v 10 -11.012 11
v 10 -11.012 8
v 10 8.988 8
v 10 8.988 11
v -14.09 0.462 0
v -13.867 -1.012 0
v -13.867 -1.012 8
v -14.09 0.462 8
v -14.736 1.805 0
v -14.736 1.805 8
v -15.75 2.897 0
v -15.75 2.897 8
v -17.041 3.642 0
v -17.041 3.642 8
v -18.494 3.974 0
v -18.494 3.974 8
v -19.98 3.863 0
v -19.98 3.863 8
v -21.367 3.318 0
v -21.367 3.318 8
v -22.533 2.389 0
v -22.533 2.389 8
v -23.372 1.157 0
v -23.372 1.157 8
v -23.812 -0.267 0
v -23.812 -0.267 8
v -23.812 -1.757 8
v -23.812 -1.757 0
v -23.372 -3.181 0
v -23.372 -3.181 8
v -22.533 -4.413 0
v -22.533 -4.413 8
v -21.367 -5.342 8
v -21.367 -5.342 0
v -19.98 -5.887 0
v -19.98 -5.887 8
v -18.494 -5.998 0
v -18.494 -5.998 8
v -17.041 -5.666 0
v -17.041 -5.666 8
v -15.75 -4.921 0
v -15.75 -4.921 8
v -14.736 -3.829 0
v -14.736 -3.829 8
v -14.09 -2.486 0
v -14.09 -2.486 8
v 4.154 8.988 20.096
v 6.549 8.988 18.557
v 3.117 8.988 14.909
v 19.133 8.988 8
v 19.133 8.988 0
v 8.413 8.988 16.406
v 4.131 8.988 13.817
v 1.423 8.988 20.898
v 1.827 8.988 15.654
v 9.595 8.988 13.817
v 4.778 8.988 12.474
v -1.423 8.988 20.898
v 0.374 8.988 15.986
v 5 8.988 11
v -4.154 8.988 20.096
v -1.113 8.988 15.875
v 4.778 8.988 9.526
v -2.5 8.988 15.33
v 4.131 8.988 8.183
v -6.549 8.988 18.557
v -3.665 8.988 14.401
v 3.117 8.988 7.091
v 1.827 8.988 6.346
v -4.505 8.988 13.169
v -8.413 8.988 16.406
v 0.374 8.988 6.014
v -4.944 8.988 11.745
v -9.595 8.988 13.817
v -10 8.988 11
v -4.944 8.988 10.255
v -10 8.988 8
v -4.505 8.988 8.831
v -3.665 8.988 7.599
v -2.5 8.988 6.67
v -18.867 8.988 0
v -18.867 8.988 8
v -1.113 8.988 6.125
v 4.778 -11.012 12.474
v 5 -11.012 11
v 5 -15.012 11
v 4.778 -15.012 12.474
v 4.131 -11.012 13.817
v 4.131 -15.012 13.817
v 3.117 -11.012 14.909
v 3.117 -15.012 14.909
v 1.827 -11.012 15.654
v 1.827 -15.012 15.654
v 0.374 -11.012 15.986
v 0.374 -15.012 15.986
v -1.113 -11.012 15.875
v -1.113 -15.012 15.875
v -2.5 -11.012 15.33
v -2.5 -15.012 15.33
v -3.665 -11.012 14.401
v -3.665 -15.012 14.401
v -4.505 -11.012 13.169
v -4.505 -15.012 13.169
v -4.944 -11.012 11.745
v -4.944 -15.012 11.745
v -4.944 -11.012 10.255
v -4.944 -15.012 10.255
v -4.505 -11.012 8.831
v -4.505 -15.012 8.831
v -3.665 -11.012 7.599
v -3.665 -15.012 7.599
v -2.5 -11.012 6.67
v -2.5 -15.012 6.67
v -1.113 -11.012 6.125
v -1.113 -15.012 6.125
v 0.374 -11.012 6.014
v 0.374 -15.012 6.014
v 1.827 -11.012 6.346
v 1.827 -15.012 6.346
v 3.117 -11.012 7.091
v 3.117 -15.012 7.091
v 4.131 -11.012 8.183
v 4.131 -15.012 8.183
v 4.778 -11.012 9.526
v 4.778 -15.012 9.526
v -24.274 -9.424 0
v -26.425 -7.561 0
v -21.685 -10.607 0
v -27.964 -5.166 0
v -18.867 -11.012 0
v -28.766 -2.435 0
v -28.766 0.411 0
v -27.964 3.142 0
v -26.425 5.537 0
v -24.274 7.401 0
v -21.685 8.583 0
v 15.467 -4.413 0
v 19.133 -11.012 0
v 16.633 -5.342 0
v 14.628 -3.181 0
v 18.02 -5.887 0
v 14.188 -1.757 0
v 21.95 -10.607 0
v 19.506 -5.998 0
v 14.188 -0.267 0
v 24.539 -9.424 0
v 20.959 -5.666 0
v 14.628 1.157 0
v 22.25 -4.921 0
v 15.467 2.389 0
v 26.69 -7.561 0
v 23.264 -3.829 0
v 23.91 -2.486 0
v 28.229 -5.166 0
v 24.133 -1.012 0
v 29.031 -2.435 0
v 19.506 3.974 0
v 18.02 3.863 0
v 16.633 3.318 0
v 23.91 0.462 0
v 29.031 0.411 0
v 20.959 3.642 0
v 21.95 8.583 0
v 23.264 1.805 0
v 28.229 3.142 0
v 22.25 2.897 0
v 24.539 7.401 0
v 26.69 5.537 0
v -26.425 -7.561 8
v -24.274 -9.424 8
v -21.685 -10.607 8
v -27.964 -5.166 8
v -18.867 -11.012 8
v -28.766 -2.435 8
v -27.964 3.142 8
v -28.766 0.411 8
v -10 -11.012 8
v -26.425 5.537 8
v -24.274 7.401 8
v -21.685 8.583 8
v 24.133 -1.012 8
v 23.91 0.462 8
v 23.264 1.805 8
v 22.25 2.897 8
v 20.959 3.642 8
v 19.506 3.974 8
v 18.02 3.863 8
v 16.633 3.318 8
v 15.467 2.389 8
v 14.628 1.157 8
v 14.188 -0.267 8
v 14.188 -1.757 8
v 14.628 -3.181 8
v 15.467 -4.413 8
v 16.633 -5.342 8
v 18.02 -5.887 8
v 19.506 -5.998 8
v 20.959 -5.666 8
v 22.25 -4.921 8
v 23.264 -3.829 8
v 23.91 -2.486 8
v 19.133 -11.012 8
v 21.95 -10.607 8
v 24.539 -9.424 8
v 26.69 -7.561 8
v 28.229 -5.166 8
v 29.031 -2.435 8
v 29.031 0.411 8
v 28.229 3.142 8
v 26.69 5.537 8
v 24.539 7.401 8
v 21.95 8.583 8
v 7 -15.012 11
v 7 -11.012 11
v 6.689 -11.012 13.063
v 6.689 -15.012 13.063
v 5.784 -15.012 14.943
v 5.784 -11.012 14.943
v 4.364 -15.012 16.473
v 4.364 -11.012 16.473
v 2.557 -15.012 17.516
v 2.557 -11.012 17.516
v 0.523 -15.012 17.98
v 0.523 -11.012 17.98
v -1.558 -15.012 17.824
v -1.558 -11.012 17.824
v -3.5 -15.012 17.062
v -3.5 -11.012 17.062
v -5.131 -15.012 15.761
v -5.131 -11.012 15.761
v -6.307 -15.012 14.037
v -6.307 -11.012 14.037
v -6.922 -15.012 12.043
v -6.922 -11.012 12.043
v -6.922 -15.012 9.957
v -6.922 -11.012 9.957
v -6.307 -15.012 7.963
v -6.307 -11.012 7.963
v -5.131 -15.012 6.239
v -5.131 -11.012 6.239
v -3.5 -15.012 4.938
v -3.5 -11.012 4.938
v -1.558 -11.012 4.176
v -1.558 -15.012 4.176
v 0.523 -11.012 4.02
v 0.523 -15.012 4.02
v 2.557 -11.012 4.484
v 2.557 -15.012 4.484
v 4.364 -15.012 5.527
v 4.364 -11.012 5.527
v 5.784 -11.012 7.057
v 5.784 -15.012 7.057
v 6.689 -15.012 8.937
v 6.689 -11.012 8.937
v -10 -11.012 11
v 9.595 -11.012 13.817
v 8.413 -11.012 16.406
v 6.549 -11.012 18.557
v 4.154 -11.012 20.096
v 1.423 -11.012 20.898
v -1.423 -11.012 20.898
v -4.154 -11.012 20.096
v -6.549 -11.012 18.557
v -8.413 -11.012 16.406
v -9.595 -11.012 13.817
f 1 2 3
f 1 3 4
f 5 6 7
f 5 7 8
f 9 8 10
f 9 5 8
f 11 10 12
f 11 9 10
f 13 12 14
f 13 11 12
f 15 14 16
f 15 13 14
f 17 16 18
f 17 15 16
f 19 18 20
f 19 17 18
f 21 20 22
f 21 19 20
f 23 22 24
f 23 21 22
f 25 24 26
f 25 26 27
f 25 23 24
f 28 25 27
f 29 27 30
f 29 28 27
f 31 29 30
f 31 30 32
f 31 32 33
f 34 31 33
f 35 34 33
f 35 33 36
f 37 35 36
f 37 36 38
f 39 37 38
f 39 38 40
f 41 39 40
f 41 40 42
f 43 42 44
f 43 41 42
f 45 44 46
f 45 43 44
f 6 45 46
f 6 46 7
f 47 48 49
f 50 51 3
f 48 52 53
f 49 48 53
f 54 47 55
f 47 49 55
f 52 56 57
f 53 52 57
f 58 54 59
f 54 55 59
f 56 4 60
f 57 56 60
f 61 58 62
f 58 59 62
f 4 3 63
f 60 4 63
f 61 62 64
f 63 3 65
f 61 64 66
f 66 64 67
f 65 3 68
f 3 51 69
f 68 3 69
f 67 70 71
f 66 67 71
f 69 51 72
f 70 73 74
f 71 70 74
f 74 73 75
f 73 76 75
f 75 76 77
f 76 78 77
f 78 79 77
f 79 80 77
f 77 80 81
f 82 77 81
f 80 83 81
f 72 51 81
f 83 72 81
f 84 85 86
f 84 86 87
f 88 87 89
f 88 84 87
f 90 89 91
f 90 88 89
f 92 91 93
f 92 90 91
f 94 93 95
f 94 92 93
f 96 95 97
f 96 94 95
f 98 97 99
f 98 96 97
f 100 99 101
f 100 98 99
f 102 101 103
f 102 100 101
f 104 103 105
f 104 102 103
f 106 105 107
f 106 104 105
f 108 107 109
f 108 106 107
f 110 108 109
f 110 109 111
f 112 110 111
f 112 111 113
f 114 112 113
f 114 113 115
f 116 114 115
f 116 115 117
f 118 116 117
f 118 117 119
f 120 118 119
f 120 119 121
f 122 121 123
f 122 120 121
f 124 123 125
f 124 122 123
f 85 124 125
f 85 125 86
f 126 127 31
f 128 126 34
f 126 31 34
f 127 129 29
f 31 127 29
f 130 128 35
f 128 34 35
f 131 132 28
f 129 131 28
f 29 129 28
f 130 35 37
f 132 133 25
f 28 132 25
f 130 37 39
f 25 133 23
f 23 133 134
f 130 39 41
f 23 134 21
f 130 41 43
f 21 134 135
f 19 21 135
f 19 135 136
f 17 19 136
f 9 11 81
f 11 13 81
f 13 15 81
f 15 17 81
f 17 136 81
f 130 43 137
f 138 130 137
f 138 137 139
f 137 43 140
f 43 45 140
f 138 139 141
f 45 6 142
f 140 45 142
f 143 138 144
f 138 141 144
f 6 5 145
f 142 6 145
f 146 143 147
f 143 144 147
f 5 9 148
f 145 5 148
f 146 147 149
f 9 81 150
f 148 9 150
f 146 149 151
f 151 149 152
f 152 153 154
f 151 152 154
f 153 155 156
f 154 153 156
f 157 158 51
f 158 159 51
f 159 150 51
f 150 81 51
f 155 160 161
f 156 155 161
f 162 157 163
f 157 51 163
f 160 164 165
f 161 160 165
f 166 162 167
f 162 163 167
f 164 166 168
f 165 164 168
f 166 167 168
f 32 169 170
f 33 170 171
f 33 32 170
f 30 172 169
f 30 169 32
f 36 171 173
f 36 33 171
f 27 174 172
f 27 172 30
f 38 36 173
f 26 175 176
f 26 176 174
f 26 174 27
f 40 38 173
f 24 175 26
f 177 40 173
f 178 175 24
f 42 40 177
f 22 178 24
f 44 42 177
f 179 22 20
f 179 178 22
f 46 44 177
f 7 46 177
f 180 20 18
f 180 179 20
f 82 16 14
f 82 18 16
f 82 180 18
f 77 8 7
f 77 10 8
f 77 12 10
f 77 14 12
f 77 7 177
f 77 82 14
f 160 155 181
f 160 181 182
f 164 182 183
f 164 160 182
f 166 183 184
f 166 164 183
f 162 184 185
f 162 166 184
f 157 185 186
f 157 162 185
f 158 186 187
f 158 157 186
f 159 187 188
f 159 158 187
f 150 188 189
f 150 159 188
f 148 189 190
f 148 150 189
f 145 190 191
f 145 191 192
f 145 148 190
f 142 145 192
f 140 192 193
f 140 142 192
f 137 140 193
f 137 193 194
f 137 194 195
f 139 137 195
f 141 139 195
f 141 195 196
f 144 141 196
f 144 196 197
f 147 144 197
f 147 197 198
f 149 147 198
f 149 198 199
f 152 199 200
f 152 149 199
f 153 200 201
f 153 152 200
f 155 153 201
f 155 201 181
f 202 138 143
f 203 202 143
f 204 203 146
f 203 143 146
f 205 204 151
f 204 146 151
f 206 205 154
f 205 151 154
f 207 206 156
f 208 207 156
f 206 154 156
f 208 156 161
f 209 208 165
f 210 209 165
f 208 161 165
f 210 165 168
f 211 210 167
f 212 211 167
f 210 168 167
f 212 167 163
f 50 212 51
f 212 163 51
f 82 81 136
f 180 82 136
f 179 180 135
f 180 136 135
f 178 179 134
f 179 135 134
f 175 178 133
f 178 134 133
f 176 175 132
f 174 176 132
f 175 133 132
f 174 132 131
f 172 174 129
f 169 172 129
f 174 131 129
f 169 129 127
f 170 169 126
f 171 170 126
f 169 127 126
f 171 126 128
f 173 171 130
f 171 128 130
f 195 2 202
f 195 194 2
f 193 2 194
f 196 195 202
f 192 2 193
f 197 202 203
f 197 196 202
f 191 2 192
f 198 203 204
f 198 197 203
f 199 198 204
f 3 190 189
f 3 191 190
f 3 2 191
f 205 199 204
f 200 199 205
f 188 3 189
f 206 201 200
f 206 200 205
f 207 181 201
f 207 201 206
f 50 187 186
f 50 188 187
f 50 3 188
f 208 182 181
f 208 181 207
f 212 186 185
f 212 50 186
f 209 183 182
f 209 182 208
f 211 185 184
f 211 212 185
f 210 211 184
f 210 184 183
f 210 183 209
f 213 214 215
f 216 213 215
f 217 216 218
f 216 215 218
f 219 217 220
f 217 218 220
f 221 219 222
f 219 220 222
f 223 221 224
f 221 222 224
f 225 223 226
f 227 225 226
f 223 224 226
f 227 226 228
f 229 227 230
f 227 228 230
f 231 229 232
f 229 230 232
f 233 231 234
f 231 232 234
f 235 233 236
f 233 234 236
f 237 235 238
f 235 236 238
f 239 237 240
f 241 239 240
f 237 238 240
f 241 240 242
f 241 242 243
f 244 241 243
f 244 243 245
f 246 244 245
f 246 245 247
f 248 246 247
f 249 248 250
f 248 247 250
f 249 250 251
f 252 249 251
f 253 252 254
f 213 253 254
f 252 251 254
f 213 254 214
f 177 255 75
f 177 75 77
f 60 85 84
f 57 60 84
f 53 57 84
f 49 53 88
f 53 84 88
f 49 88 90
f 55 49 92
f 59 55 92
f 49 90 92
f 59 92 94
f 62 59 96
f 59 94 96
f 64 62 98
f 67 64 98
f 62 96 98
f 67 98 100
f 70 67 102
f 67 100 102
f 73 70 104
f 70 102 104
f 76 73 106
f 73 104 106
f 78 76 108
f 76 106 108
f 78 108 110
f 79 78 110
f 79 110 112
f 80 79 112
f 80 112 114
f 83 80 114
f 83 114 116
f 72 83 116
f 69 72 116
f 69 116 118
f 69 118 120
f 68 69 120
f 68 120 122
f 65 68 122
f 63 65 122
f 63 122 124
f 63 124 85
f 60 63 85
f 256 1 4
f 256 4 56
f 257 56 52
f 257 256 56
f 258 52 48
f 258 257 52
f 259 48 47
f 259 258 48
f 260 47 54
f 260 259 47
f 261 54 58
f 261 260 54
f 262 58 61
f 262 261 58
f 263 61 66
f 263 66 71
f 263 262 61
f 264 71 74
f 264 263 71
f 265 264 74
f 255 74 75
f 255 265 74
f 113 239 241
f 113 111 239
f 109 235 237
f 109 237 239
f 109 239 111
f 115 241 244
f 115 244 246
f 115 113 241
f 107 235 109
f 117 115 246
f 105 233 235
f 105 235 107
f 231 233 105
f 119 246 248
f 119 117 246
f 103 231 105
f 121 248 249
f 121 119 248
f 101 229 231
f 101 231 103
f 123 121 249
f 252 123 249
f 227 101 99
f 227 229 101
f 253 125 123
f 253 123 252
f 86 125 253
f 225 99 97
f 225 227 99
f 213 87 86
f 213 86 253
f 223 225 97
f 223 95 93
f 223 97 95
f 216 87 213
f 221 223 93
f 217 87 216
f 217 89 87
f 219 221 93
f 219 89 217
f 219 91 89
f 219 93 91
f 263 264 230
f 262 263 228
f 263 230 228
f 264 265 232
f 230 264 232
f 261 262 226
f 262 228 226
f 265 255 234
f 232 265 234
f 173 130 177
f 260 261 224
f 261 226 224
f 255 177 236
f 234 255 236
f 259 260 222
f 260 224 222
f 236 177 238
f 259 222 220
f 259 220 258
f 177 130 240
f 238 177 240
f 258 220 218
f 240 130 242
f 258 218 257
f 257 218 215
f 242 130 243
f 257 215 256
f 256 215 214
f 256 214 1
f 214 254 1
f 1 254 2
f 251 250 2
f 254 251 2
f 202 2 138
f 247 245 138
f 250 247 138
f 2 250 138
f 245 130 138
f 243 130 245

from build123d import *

# Parameters (mm, degrees)
F0_R     = 5
F1_DEPTH = 8
F3_DEPTH = 20
F4_R     = 5
F5_DEPTH = 20.001
F4_R_2   = 7
F6_DEPTH = 4


with BuildPart() as f1:
    # F0 (on Top) → F1 (new body)
    with BuildSketch(Plane.XY):
        with BuildLine():
            ThreePointArc((-18.86745, 8.988079), (-28.86745, -1.011921), (-18.86745, -11.011921))
            Line((-18.86745, -11.011921), (19.13255, -11.011921))
            ThreePointArc((19.13255, -11.011921), (29.13255, -1.011921), (19.13255, 8.988079))
            Line((19.13255, 8.988079), (-18.86745, 8.988079))
        make_face()
        with Locations((-18.86745, -1.011921)):
            Circle(F0_R, mode=Mode.SUBTRACT)
        with Locations((19.13255, -1.011921)):
            Circle(F0_R, mode=Mode.SUBTRACT)
    extrude(amount=F1_DEPTH)

    # F2 (on face) → F3 (join)
    with BuildSketch(Plane.XZ.offset(11.011921)):
        Polygon((-10, 11), (-10, 8), (0, 8), (10, 8), (10, 11), (0, 11), align=None)
        with BuildLine():
            ThreePointArc((10, 11), (0, 21), (-10, 11))
            Line((-10, 11), (0, 11))
            Line((0, 11), (10, 11))
        make_face()
    extrude(amount=-F3_DEPTH)

    # F4 (on face) → F5 (cut, through all)
    with BuildSketch(Plane.XZ.offset(11.011921)):
        with Locations((0, 11)):
            Circle(F4_R)
    extrude(amount=-F5_DEPTH, mode=Mode.SUBTRACT)

    # F4 (on face) → F6 (join)
    with BuildSketch(Plane.XZ.offset(11.011921)):
        with Locations((0, 11)):
            Circle(F4_R_2)
        with Locations((0, 11)):
            Circle(F4_R, mode=Mode.SUBTRACT)
    extrude(amount=F6_DEPTH)


solid = f1.part
